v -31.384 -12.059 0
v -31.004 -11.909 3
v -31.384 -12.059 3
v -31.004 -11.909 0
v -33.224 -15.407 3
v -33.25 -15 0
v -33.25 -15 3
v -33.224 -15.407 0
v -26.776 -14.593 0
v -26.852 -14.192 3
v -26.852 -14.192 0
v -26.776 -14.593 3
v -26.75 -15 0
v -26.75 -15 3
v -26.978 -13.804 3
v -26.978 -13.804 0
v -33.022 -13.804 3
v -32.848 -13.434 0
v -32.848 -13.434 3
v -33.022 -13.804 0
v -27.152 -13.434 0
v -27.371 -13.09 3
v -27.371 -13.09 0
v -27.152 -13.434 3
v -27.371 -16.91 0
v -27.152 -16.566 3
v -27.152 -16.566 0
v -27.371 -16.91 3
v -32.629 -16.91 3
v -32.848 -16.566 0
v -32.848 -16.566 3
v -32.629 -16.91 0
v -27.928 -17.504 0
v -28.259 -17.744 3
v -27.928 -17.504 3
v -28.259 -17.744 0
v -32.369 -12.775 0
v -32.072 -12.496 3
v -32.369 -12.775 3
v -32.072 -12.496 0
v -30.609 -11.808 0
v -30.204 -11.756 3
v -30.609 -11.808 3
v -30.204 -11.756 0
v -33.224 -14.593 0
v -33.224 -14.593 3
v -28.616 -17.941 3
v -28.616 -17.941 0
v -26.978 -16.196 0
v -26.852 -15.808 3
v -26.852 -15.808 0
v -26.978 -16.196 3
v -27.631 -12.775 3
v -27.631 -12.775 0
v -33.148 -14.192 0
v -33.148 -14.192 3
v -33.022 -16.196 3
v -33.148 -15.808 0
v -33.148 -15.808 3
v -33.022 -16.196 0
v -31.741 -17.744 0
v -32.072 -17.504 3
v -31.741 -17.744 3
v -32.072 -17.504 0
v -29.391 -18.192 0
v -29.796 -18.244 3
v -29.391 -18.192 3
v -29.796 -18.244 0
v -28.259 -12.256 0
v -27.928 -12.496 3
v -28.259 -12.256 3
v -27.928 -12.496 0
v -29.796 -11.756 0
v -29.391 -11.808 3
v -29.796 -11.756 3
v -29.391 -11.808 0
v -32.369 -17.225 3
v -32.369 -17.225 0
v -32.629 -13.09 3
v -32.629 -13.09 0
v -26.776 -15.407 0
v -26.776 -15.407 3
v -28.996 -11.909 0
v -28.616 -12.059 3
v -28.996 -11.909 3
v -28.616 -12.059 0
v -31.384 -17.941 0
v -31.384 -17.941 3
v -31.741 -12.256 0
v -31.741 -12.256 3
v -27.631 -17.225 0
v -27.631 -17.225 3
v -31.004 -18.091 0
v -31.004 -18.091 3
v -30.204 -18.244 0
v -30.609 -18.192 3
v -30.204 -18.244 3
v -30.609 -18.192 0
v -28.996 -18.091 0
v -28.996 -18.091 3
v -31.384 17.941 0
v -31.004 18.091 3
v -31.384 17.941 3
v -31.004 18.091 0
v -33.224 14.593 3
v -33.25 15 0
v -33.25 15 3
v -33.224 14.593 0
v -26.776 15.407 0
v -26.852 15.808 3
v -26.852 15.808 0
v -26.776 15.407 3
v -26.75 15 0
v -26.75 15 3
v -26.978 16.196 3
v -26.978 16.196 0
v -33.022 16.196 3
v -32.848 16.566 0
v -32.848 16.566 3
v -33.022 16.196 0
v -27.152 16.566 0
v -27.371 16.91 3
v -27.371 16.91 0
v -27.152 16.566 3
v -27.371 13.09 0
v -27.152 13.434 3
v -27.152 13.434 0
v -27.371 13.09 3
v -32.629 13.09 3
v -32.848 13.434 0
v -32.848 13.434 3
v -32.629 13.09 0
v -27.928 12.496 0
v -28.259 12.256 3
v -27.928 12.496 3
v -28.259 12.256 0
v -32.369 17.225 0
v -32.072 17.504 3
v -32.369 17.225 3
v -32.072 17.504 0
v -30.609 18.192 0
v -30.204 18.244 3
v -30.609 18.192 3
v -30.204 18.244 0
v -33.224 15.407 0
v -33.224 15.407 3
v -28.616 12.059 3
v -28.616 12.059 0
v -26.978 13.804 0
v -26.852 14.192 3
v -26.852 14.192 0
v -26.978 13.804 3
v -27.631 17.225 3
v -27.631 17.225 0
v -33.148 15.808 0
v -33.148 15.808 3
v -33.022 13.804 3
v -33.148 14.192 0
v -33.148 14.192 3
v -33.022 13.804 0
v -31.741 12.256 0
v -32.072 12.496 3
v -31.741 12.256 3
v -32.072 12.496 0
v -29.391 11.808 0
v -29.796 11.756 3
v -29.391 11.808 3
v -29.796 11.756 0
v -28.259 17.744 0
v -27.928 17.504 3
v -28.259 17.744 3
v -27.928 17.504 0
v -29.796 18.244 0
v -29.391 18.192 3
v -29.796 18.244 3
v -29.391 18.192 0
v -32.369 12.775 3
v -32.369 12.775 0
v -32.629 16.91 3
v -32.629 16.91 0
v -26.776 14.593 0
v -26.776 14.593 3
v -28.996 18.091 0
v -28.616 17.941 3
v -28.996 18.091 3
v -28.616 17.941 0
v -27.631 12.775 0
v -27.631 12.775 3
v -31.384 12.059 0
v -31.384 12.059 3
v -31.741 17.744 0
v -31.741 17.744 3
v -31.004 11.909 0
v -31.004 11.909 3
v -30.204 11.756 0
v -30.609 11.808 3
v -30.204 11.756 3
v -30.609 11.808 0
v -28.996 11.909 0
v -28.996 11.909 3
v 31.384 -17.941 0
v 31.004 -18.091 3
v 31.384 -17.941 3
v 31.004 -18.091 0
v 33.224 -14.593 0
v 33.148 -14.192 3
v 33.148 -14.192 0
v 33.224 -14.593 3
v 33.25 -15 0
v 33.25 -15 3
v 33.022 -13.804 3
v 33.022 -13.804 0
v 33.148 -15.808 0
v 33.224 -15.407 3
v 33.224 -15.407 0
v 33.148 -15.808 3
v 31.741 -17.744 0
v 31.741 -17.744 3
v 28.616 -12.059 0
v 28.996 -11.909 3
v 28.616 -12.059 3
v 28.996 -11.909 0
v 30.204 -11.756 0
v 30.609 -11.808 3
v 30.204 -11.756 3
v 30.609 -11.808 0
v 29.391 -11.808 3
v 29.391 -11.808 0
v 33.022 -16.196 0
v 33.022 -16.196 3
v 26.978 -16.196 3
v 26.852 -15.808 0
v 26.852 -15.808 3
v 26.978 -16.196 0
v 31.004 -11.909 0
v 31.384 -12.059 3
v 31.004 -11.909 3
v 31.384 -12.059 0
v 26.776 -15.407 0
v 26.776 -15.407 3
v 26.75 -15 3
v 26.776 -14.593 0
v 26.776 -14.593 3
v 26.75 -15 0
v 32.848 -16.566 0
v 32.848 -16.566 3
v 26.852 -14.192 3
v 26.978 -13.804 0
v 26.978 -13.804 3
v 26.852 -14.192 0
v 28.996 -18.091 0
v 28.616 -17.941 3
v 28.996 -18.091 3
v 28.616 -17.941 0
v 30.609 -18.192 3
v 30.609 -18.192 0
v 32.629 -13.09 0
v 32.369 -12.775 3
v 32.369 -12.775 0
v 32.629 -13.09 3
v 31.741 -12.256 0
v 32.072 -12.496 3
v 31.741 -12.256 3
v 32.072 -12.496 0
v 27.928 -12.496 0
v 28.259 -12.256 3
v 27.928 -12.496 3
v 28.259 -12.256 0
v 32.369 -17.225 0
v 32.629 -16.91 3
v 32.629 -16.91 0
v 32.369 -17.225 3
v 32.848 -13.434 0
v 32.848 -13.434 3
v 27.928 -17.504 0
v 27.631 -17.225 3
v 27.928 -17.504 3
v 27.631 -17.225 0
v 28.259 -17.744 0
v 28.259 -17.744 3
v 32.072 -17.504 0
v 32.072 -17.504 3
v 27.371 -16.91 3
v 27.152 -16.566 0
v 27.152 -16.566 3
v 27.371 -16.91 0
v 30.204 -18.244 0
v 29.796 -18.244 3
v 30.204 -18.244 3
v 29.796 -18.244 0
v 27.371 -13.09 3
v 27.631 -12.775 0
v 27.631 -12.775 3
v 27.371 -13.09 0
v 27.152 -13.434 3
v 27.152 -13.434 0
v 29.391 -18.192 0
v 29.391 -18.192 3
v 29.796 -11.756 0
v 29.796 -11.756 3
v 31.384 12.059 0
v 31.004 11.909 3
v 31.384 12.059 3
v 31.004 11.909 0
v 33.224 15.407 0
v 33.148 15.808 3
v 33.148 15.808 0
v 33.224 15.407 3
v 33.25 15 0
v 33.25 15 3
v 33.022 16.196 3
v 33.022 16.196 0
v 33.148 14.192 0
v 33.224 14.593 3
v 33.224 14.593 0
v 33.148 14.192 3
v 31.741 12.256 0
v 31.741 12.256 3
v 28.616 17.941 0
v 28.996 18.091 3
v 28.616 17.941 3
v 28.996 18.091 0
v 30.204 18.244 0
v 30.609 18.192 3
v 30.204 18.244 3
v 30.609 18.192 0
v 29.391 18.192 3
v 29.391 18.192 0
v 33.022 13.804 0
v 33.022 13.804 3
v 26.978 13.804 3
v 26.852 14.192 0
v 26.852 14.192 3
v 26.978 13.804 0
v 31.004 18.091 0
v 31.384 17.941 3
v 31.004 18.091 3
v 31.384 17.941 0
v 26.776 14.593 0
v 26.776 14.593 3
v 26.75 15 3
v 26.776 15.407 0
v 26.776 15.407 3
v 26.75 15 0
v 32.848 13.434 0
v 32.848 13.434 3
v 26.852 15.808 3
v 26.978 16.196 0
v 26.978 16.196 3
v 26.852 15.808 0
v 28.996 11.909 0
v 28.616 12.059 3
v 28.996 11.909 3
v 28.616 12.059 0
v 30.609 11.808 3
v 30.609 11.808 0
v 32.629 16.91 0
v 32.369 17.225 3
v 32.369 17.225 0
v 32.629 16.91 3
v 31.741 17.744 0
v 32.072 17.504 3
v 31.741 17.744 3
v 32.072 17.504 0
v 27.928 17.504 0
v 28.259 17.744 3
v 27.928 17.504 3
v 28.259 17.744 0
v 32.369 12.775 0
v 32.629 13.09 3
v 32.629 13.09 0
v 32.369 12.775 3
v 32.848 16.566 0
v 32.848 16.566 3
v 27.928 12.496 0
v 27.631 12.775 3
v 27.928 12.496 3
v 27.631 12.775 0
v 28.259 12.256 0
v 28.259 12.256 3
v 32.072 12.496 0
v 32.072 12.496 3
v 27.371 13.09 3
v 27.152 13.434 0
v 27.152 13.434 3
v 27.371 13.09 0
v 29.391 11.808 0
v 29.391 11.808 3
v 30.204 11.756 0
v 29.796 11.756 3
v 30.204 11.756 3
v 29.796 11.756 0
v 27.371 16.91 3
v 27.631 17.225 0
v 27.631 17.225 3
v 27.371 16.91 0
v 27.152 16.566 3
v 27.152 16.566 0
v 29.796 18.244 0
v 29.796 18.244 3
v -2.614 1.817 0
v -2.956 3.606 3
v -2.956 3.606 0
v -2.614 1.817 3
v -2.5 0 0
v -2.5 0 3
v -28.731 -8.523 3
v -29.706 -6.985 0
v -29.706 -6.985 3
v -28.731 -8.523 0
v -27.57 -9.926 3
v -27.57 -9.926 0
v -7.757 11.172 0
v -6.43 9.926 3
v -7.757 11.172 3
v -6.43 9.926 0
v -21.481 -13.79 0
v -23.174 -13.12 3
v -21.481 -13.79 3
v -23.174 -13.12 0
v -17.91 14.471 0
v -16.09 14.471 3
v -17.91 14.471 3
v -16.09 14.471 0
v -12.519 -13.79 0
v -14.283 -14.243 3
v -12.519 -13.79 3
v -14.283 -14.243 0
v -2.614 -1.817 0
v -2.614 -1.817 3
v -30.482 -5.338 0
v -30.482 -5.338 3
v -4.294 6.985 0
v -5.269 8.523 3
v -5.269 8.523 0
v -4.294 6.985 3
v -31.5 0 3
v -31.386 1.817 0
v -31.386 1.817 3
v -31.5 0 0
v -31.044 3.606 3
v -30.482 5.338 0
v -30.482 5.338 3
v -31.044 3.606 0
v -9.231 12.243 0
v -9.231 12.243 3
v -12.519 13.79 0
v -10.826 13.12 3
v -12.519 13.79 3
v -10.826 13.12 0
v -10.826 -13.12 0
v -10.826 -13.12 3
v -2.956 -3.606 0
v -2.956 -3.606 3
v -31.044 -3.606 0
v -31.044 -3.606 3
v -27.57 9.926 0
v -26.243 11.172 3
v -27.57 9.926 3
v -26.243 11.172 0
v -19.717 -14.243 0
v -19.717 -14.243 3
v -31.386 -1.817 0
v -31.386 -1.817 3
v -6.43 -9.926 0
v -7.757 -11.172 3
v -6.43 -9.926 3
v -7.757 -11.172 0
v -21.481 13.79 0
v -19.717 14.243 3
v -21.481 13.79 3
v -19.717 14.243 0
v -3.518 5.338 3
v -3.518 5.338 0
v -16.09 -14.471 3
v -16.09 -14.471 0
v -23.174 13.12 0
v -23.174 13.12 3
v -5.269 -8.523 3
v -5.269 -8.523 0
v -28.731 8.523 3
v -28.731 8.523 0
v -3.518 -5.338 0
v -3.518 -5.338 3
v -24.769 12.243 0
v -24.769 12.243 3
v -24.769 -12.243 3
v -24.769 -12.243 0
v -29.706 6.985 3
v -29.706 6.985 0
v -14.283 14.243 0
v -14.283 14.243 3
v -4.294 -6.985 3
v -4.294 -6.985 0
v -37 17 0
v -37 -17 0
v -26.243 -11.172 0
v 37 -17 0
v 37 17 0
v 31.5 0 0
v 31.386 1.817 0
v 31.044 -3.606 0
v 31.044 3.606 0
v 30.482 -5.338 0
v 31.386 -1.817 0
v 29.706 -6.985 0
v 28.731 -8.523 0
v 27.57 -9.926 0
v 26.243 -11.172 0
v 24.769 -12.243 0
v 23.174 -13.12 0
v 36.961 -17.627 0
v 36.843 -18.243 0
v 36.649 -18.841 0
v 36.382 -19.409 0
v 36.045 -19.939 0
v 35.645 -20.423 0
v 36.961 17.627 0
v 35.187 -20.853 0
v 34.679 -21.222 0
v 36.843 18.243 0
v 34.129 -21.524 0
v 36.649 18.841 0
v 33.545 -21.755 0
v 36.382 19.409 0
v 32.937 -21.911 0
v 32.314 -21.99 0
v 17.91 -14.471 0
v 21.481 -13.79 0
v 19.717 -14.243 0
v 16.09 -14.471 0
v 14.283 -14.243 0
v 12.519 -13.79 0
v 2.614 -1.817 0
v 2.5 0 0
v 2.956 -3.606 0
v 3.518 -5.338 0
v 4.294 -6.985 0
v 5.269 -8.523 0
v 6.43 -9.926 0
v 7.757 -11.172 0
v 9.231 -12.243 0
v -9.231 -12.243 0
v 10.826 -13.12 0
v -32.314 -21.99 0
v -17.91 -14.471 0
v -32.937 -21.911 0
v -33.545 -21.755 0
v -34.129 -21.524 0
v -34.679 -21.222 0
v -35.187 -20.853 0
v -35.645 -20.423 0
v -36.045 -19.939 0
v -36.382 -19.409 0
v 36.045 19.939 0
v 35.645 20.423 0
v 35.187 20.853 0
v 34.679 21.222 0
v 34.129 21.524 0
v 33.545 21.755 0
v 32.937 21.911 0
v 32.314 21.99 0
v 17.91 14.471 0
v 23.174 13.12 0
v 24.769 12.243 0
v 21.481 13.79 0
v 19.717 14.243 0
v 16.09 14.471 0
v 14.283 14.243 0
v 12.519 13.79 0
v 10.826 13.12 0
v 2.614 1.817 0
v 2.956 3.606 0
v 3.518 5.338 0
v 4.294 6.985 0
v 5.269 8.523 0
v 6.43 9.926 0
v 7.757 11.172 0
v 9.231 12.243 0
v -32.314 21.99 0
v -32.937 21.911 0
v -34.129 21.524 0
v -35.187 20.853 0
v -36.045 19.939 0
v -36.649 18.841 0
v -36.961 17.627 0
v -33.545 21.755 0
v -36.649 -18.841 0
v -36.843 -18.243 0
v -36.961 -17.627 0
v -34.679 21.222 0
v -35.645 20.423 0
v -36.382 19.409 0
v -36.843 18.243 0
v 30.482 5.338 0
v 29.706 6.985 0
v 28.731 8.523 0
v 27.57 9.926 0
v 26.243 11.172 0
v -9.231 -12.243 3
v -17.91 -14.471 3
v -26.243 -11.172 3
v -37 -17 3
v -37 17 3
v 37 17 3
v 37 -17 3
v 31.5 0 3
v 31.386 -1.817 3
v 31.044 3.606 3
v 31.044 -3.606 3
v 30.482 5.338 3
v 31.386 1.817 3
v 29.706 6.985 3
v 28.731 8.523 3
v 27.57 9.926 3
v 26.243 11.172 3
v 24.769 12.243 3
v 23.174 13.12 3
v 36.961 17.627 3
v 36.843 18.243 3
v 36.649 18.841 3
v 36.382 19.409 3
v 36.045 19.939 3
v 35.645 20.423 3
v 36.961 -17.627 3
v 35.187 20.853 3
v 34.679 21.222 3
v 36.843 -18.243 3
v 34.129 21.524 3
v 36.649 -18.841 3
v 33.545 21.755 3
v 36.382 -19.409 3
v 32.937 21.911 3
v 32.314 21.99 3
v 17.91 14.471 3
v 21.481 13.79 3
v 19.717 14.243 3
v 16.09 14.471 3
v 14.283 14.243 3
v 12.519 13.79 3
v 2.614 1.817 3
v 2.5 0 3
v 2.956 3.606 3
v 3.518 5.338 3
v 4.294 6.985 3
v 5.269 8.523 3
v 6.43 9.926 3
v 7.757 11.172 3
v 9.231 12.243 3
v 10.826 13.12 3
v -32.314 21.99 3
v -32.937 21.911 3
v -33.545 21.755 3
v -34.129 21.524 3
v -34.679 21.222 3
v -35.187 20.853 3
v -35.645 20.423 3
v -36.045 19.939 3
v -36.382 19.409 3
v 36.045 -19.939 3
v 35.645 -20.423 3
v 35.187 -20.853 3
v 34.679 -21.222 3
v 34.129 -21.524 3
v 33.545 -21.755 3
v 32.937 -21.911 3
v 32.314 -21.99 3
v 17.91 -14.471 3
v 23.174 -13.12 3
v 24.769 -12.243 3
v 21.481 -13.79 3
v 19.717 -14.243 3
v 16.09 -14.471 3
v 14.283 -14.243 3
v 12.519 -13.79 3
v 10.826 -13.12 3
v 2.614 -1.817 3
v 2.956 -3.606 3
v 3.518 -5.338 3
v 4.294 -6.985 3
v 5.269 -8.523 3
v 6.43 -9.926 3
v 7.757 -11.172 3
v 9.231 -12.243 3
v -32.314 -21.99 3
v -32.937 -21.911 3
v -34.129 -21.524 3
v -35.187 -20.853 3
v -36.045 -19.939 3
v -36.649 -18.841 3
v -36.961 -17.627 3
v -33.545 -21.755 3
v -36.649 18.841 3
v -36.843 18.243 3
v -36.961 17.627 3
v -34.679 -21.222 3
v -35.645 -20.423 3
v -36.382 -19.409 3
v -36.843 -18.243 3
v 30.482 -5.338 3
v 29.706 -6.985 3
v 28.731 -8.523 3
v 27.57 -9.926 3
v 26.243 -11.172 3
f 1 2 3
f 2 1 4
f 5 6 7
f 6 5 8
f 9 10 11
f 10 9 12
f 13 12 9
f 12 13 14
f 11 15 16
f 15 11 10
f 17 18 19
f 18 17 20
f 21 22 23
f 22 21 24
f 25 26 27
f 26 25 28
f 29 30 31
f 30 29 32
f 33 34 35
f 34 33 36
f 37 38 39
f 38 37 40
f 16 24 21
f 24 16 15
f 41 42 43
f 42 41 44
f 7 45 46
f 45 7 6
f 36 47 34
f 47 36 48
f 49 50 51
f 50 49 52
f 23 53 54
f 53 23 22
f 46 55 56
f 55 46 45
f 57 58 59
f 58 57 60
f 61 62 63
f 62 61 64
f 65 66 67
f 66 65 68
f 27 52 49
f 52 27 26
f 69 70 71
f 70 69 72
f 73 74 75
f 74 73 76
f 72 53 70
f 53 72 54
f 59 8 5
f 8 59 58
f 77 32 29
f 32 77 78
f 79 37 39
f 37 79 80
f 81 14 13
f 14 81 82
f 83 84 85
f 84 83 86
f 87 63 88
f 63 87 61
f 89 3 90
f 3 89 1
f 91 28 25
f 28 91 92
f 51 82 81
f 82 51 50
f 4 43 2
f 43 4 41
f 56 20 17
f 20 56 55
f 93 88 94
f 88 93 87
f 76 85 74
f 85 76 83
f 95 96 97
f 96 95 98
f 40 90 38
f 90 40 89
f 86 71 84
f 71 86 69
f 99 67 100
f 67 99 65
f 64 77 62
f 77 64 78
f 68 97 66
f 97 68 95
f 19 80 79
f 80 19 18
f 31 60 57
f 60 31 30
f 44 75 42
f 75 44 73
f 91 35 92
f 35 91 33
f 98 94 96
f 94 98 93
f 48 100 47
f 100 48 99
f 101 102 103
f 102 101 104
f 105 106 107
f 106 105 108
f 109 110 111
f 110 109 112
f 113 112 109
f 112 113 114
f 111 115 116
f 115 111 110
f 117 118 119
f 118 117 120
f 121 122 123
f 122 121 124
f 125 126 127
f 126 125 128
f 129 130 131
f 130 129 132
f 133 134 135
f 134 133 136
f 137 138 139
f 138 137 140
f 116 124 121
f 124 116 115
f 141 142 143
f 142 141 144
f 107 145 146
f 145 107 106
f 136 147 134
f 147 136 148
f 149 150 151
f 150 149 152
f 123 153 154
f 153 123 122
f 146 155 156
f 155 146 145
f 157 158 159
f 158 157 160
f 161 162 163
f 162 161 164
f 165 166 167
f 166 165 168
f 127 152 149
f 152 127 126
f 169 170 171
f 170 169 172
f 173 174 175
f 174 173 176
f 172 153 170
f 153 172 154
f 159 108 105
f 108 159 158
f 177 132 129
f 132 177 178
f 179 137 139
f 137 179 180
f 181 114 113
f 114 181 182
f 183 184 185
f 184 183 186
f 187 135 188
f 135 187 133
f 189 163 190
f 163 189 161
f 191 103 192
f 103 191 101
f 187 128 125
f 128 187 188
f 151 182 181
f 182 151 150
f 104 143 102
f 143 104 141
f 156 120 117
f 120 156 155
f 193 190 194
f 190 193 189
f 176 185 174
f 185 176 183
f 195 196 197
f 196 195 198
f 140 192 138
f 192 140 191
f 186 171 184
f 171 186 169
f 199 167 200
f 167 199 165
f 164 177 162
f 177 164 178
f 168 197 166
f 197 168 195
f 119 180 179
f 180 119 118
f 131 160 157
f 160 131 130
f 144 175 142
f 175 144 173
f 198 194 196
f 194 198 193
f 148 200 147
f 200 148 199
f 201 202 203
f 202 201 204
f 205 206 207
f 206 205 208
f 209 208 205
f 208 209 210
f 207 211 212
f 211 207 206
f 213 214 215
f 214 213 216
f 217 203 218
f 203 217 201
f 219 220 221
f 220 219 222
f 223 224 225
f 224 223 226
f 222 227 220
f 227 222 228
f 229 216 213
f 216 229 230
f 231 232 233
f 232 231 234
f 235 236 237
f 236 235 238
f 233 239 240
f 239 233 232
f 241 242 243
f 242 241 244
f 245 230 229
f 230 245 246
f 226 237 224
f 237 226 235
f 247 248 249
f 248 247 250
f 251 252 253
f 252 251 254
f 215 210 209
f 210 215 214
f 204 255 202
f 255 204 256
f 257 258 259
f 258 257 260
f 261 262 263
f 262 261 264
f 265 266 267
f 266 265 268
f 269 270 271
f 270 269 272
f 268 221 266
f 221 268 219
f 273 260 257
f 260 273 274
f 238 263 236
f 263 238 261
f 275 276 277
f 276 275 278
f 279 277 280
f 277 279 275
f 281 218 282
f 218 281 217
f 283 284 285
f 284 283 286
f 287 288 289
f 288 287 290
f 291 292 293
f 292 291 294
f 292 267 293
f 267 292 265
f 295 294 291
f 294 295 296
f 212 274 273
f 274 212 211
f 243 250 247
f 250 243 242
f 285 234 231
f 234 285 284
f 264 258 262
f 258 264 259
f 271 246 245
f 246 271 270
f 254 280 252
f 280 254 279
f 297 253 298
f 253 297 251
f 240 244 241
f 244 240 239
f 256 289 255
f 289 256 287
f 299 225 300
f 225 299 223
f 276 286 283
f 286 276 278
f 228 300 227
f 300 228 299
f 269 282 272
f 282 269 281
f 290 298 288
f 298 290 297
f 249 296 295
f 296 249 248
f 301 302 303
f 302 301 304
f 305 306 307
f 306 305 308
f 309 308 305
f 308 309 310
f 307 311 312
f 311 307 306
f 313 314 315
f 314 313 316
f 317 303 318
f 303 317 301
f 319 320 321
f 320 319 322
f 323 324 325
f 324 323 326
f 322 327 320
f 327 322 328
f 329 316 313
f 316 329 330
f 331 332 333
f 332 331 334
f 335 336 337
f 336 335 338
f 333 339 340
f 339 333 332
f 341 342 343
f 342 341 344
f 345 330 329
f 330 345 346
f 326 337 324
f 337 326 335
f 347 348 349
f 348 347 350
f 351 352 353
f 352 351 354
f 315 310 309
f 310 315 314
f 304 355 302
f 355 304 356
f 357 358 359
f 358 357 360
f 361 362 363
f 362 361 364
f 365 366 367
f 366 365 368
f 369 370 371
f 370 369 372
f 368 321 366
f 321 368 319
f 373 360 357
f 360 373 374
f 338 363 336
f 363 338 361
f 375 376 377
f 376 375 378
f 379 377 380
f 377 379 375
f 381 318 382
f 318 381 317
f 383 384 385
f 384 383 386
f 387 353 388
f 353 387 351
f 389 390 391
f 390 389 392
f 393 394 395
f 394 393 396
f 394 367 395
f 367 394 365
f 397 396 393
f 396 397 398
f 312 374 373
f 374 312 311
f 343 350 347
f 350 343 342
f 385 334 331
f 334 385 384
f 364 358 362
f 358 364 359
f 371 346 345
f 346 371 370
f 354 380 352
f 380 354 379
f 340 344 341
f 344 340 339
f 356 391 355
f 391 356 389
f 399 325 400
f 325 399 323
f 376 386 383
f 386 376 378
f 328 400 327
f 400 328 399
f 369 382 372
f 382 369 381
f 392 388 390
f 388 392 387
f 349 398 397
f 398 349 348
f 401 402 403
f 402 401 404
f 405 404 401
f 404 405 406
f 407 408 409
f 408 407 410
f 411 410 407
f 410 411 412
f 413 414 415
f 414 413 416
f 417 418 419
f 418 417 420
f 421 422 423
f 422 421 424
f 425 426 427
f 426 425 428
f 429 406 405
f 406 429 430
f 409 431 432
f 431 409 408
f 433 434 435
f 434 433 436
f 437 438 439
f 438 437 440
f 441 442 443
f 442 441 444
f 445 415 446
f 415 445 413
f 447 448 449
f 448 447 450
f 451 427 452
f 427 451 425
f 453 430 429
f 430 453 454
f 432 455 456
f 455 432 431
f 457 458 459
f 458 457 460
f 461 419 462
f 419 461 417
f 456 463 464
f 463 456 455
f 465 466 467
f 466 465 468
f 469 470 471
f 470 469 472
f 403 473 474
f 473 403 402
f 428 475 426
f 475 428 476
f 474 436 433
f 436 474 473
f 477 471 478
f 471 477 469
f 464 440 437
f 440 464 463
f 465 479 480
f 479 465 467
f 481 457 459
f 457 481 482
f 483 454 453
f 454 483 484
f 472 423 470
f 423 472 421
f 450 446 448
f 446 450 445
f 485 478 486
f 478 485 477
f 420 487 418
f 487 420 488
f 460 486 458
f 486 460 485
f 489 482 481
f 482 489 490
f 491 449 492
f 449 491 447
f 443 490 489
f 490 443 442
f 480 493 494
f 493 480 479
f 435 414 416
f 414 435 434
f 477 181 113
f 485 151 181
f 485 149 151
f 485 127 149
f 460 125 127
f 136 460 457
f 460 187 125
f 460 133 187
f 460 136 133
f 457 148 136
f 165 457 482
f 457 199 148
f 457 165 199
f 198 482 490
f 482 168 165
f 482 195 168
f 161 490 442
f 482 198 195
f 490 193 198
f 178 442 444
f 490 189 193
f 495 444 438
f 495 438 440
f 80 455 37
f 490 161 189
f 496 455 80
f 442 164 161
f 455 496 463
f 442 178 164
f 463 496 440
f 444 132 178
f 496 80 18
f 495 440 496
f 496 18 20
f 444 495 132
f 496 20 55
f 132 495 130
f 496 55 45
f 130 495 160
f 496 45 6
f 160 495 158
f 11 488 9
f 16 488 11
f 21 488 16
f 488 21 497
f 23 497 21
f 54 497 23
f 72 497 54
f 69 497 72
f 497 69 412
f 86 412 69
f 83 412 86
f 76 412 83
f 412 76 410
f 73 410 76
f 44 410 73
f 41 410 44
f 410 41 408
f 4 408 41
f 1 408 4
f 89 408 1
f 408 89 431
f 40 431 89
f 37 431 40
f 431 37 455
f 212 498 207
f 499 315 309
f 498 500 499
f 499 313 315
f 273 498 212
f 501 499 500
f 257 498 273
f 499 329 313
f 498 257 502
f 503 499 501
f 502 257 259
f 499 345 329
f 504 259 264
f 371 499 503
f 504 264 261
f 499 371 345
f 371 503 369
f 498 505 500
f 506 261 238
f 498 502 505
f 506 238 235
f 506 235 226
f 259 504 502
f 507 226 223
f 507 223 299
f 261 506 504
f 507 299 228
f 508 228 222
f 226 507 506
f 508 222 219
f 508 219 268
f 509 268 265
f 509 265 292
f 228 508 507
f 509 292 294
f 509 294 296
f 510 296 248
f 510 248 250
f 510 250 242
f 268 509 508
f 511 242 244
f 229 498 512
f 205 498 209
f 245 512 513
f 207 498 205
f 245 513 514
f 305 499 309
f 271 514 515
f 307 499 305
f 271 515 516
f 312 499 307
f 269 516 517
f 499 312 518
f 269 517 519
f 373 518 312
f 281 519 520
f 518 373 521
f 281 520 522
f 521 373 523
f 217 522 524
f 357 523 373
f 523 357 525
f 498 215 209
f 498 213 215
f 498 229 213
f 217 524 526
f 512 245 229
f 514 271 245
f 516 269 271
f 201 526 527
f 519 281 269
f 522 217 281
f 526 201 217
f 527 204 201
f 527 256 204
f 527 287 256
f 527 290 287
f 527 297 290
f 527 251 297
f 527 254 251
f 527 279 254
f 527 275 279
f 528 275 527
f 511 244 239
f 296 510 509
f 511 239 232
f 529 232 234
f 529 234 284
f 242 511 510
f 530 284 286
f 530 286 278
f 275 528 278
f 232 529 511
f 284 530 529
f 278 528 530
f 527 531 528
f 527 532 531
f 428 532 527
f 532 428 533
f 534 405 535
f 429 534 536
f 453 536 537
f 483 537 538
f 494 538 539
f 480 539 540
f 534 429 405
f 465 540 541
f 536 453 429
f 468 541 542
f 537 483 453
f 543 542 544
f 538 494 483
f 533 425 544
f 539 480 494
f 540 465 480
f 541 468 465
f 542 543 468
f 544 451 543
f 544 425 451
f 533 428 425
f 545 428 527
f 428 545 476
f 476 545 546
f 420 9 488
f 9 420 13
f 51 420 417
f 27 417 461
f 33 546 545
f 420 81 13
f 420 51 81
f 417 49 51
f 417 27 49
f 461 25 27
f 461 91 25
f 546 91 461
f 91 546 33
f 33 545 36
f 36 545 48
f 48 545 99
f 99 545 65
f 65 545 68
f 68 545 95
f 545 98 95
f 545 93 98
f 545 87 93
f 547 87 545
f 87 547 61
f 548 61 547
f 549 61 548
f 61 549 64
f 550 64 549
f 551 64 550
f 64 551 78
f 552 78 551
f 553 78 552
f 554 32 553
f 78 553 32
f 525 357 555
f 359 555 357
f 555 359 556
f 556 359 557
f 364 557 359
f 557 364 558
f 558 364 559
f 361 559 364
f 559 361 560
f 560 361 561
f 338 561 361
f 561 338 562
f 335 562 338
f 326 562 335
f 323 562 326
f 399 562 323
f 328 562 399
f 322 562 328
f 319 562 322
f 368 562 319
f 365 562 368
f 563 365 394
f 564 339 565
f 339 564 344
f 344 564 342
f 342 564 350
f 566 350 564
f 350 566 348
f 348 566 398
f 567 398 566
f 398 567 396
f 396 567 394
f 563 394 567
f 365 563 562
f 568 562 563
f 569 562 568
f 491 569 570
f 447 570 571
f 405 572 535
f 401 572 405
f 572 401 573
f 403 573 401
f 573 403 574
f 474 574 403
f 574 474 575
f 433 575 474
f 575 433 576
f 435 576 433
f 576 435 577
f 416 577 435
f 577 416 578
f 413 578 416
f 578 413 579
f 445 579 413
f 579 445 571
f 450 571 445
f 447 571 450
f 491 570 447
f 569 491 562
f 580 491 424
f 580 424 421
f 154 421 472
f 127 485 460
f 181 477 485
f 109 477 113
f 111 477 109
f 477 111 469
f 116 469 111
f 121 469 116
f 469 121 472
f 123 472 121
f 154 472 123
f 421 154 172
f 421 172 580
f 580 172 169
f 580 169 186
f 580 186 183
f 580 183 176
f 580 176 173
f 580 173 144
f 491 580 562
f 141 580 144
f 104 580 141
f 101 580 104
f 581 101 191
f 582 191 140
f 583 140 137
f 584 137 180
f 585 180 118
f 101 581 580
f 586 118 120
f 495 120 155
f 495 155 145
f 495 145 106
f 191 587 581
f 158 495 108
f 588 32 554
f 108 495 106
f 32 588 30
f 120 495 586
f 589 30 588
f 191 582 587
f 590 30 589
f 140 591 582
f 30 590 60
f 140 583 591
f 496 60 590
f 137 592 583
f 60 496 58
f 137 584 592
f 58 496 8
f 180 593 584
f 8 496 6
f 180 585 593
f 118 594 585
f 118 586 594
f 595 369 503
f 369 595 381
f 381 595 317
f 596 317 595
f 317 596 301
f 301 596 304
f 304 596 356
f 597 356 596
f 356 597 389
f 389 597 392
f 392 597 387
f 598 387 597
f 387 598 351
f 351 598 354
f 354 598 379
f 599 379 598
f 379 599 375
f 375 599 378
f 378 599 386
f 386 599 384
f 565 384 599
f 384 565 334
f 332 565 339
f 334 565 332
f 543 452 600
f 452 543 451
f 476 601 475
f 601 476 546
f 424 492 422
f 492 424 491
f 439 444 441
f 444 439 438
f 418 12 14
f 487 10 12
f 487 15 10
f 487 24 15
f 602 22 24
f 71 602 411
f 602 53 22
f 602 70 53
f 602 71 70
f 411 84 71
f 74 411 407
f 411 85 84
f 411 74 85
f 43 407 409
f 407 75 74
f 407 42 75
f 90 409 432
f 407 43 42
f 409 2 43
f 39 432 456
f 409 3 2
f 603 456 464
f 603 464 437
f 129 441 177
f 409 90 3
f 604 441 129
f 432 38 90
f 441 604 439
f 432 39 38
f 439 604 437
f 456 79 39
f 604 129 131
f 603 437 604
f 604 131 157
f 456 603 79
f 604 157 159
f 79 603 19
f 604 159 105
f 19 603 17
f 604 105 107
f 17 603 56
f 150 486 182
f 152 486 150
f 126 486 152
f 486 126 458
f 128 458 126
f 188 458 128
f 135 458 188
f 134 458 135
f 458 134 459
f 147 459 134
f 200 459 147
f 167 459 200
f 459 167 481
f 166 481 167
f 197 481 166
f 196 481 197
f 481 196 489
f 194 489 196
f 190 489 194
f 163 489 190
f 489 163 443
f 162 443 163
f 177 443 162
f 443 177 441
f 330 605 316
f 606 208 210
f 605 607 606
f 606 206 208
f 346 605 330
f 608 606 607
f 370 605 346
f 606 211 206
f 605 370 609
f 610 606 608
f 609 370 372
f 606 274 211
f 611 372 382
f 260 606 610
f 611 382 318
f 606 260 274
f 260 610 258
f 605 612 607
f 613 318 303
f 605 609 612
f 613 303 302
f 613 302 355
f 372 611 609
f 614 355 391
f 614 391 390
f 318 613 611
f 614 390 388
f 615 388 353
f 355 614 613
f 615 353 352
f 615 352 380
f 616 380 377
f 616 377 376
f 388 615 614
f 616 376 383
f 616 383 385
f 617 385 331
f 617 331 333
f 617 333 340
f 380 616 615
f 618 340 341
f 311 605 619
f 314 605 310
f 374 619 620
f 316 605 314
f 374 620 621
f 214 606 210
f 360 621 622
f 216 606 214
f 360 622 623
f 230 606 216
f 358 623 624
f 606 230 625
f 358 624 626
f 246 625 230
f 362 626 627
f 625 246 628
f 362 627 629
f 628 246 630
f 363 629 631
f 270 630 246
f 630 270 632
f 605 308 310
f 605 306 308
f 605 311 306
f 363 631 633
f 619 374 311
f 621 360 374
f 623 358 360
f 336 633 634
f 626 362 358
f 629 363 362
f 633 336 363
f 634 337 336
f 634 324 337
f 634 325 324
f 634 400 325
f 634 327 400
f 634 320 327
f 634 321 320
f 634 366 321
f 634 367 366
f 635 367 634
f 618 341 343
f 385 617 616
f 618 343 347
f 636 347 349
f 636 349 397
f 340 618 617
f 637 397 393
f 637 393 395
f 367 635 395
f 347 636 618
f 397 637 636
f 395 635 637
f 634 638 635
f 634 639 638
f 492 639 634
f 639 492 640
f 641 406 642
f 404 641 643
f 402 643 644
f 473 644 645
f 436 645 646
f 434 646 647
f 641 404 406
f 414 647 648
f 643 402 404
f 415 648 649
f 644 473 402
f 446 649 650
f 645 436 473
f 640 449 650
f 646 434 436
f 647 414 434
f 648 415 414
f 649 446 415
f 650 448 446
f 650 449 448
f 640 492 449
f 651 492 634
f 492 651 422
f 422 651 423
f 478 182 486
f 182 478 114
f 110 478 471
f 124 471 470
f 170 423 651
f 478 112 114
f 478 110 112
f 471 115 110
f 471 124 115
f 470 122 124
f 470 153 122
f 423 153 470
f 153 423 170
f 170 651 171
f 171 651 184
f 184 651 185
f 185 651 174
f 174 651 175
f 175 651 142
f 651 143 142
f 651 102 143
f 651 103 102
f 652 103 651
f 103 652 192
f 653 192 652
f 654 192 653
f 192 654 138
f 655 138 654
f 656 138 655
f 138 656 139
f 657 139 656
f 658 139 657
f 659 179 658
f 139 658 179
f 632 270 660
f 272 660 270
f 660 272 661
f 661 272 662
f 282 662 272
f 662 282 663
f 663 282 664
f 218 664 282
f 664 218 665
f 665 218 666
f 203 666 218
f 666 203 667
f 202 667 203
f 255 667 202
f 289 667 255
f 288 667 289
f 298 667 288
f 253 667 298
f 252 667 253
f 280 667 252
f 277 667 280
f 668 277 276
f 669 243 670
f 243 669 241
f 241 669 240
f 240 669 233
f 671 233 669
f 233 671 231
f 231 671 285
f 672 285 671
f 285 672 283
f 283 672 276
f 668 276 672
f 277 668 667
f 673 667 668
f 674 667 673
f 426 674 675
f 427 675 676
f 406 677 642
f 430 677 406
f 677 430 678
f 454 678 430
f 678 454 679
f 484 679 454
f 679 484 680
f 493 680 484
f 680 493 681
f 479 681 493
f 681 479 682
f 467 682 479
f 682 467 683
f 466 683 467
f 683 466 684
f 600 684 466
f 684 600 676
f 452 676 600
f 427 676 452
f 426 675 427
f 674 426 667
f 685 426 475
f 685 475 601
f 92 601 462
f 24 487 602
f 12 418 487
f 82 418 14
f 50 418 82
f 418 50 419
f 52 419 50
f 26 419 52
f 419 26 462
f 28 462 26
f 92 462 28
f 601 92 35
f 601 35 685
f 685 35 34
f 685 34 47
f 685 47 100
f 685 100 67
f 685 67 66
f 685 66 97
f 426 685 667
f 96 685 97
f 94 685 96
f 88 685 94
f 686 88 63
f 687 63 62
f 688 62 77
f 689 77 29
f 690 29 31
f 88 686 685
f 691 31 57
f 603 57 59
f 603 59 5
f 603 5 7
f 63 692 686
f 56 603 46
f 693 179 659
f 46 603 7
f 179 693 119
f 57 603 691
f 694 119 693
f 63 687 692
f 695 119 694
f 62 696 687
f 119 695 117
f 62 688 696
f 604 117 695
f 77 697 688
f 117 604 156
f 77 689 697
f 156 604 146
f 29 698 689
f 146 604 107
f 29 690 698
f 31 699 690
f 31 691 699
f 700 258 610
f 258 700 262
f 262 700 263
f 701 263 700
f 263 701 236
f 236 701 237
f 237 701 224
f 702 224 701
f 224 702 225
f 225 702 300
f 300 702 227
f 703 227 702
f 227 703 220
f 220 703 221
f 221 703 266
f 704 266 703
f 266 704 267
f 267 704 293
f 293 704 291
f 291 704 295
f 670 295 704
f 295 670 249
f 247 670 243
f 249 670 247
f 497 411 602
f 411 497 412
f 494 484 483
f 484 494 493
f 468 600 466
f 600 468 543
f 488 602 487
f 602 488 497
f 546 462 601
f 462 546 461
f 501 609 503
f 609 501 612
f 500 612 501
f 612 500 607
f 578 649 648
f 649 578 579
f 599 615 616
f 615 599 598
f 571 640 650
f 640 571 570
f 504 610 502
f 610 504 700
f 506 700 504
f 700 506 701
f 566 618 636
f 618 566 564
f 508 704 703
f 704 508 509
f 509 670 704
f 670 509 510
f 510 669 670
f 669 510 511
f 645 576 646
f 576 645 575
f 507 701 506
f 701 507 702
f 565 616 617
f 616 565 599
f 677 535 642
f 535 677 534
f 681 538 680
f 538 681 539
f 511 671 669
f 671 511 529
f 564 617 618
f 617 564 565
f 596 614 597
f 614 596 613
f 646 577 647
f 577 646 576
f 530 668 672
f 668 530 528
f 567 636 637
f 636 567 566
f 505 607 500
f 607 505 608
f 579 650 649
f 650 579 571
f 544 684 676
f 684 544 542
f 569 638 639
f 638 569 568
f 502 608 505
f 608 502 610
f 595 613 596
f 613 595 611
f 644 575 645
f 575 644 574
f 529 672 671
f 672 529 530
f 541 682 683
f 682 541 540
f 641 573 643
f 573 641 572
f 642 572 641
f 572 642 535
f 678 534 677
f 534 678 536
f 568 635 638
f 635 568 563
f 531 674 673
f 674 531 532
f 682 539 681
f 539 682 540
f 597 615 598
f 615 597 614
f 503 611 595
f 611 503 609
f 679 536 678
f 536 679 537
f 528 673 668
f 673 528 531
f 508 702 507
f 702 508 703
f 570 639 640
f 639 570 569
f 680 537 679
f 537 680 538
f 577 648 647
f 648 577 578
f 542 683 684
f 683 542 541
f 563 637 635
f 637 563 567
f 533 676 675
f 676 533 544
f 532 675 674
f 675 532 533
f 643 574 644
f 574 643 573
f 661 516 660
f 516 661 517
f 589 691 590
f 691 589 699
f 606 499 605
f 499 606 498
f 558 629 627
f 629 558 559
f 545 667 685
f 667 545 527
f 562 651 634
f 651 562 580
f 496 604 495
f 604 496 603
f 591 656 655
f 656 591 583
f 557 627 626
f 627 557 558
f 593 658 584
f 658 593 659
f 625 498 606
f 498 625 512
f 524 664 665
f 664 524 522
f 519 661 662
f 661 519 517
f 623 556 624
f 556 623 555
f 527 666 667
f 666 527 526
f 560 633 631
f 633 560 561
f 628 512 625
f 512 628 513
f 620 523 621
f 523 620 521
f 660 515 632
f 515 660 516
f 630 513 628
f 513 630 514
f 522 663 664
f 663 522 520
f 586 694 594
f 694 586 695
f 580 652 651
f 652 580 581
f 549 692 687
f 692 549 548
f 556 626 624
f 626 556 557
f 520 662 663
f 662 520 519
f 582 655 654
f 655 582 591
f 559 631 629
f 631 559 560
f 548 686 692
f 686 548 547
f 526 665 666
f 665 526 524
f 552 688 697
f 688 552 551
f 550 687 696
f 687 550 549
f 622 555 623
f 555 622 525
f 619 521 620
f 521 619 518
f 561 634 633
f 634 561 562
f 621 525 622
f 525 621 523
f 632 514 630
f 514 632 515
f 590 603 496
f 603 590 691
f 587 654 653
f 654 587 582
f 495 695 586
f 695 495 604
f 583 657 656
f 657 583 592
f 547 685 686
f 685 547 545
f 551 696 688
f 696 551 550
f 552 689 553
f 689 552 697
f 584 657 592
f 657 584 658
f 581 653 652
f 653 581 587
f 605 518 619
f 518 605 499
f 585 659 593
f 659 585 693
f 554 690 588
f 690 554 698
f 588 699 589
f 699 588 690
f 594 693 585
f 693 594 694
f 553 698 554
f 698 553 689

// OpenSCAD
$fn = 50;

difference() {
	union() {
		hull() {
			translate(v = [-32.0, 17.0, 0]) {
				cylinder(h = 3, r = 5);
			}
			translate(v = [32.0, 17.0, 0]) {
				cylinder(h = 3, r = 5);
			}
			translate(v = [-32.0, -17.0, 0]) {
				cylinder(h = 3, r = 5);
			}
			translate(v = [32.0, -17.0, 0]) {
				cylinder(h = 3, r = 5);
			}
		}
	}
	union() {
		translate(v = [-30.0, -15.0, -100.0]) {
			cylinder(h = 200, r = 3.25);
		}
		translate(v = [-30.0, 15.0, -100.0]) {
			cylinder(h = 200, r = 3.25);
		}
		translate(v = [30.0, -15.0, -100.0]) {
			cylinder(h = 200, r = 3.25);
		}
		translate(v = [30.0, 15.0, -100.0]) {
			cylinder(h = 200, r = 3.25);
		}
		translate(v = [-30.0, -15.0, -100.0]) {
			cylinder(h = 200, r = 1.8);
		}
		translate(v = [-30.0, 15.0, -100.0]) {
			cylinder(h = 200, r = 1.8);
		}
		translate(v = [30.0, -15.0, -100.0]) {
			cylinder(h = 200, r = 1.8);
		}
		translate(v = [30.0, 15.0, -100.0]) {
			cylinder(h = 200, r = 1.8);
		}
		translate(v = [-17.0, 0, 0.0]) {
			cylinder(h = 3, r = 14.5);
		}
		translate(v = [17.0, 0, 0.0]) {
			cylinder(h = 3, r = 14.5);
		}
	}
}
